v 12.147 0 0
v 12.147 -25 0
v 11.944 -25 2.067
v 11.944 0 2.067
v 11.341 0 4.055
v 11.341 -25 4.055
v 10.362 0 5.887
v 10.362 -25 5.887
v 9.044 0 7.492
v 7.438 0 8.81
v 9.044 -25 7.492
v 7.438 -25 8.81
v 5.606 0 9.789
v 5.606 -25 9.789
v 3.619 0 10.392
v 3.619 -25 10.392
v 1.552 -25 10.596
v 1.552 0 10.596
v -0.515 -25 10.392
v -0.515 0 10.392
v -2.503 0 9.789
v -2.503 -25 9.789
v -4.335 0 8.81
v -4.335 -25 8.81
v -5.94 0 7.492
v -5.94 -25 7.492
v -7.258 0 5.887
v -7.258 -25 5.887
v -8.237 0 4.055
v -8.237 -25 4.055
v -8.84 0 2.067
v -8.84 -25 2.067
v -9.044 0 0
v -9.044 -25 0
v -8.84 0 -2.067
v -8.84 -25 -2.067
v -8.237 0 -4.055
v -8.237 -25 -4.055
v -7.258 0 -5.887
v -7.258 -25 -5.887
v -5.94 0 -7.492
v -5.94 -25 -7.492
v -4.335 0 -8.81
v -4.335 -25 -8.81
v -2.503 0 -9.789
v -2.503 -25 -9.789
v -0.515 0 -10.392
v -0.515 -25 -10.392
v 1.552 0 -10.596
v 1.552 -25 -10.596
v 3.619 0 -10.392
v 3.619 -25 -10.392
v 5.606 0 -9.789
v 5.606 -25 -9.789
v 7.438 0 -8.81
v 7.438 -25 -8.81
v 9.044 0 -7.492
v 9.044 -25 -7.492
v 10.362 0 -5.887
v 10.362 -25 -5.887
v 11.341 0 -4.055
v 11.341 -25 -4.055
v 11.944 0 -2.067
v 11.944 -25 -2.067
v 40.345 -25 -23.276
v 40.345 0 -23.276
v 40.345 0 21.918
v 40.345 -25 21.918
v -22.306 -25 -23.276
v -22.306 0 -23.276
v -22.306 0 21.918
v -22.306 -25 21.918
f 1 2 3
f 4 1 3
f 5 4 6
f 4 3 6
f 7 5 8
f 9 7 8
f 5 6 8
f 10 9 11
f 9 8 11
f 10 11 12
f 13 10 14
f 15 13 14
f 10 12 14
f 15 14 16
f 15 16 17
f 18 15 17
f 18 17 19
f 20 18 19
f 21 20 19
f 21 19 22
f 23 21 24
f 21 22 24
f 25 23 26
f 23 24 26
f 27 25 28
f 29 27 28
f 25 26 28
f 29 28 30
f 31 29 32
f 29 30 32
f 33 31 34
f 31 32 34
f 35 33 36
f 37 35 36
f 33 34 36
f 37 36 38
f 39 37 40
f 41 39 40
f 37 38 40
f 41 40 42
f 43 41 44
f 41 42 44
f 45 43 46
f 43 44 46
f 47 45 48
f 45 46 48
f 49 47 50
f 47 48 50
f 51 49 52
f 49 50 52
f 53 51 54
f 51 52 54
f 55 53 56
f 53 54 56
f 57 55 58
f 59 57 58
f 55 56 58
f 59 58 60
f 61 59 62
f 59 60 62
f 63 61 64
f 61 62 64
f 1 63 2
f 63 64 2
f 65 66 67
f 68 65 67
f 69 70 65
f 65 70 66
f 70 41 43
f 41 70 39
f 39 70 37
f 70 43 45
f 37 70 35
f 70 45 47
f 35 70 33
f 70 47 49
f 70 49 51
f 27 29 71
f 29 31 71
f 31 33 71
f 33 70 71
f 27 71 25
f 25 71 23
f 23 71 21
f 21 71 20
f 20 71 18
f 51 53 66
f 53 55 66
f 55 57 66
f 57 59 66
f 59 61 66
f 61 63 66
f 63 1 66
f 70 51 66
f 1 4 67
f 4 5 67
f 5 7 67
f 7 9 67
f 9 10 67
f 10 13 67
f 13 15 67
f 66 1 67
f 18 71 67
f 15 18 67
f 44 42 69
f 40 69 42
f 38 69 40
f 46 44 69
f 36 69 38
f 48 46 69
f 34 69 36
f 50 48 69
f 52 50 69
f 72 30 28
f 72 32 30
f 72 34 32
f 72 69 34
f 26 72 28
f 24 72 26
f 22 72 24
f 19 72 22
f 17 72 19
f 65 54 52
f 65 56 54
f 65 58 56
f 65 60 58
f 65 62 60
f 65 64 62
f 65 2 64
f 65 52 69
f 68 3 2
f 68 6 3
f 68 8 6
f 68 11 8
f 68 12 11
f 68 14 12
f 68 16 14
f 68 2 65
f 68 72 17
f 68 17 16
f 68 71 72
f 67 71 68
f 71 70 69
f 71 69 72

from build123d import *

# Parameters (mm, degrees)
F0_W     = 62.650863
F0_H     = 45.193966
F1_DEPTH = 25
F2_R     = 10.595561
F3_DEPTH = 25
F4_R     = 6.563376
F5_DEPTH = 25


with BuildPart() as f1:
    # F0 (on Front) → F1 (new body)
    with BuildSketch(Plane.XZ):
        with Locations((9.019395, -0.67888)):
            Rectangle(F0_W, F0_H)
    extrude(amount=F1_DEPTH)

    # F2 (on face) → F3 (cut)
    with BuildSketch(Plane.XZ.offset(25)):
        with Locations((1.551725, 0)):
            Circle(F2_R)
    extrude(amount=-F3_DEPTH, mode=Mode.SUBTRACT)

    # F4 (on face) → F5 (join)
    with BuildSketch(Plane.XZ.offset(25)):
        with Locations((26.767241, 0)):
            Circle(F4_R)
    extrude(amount=-F5_DEPTH)


solid = f1.part
